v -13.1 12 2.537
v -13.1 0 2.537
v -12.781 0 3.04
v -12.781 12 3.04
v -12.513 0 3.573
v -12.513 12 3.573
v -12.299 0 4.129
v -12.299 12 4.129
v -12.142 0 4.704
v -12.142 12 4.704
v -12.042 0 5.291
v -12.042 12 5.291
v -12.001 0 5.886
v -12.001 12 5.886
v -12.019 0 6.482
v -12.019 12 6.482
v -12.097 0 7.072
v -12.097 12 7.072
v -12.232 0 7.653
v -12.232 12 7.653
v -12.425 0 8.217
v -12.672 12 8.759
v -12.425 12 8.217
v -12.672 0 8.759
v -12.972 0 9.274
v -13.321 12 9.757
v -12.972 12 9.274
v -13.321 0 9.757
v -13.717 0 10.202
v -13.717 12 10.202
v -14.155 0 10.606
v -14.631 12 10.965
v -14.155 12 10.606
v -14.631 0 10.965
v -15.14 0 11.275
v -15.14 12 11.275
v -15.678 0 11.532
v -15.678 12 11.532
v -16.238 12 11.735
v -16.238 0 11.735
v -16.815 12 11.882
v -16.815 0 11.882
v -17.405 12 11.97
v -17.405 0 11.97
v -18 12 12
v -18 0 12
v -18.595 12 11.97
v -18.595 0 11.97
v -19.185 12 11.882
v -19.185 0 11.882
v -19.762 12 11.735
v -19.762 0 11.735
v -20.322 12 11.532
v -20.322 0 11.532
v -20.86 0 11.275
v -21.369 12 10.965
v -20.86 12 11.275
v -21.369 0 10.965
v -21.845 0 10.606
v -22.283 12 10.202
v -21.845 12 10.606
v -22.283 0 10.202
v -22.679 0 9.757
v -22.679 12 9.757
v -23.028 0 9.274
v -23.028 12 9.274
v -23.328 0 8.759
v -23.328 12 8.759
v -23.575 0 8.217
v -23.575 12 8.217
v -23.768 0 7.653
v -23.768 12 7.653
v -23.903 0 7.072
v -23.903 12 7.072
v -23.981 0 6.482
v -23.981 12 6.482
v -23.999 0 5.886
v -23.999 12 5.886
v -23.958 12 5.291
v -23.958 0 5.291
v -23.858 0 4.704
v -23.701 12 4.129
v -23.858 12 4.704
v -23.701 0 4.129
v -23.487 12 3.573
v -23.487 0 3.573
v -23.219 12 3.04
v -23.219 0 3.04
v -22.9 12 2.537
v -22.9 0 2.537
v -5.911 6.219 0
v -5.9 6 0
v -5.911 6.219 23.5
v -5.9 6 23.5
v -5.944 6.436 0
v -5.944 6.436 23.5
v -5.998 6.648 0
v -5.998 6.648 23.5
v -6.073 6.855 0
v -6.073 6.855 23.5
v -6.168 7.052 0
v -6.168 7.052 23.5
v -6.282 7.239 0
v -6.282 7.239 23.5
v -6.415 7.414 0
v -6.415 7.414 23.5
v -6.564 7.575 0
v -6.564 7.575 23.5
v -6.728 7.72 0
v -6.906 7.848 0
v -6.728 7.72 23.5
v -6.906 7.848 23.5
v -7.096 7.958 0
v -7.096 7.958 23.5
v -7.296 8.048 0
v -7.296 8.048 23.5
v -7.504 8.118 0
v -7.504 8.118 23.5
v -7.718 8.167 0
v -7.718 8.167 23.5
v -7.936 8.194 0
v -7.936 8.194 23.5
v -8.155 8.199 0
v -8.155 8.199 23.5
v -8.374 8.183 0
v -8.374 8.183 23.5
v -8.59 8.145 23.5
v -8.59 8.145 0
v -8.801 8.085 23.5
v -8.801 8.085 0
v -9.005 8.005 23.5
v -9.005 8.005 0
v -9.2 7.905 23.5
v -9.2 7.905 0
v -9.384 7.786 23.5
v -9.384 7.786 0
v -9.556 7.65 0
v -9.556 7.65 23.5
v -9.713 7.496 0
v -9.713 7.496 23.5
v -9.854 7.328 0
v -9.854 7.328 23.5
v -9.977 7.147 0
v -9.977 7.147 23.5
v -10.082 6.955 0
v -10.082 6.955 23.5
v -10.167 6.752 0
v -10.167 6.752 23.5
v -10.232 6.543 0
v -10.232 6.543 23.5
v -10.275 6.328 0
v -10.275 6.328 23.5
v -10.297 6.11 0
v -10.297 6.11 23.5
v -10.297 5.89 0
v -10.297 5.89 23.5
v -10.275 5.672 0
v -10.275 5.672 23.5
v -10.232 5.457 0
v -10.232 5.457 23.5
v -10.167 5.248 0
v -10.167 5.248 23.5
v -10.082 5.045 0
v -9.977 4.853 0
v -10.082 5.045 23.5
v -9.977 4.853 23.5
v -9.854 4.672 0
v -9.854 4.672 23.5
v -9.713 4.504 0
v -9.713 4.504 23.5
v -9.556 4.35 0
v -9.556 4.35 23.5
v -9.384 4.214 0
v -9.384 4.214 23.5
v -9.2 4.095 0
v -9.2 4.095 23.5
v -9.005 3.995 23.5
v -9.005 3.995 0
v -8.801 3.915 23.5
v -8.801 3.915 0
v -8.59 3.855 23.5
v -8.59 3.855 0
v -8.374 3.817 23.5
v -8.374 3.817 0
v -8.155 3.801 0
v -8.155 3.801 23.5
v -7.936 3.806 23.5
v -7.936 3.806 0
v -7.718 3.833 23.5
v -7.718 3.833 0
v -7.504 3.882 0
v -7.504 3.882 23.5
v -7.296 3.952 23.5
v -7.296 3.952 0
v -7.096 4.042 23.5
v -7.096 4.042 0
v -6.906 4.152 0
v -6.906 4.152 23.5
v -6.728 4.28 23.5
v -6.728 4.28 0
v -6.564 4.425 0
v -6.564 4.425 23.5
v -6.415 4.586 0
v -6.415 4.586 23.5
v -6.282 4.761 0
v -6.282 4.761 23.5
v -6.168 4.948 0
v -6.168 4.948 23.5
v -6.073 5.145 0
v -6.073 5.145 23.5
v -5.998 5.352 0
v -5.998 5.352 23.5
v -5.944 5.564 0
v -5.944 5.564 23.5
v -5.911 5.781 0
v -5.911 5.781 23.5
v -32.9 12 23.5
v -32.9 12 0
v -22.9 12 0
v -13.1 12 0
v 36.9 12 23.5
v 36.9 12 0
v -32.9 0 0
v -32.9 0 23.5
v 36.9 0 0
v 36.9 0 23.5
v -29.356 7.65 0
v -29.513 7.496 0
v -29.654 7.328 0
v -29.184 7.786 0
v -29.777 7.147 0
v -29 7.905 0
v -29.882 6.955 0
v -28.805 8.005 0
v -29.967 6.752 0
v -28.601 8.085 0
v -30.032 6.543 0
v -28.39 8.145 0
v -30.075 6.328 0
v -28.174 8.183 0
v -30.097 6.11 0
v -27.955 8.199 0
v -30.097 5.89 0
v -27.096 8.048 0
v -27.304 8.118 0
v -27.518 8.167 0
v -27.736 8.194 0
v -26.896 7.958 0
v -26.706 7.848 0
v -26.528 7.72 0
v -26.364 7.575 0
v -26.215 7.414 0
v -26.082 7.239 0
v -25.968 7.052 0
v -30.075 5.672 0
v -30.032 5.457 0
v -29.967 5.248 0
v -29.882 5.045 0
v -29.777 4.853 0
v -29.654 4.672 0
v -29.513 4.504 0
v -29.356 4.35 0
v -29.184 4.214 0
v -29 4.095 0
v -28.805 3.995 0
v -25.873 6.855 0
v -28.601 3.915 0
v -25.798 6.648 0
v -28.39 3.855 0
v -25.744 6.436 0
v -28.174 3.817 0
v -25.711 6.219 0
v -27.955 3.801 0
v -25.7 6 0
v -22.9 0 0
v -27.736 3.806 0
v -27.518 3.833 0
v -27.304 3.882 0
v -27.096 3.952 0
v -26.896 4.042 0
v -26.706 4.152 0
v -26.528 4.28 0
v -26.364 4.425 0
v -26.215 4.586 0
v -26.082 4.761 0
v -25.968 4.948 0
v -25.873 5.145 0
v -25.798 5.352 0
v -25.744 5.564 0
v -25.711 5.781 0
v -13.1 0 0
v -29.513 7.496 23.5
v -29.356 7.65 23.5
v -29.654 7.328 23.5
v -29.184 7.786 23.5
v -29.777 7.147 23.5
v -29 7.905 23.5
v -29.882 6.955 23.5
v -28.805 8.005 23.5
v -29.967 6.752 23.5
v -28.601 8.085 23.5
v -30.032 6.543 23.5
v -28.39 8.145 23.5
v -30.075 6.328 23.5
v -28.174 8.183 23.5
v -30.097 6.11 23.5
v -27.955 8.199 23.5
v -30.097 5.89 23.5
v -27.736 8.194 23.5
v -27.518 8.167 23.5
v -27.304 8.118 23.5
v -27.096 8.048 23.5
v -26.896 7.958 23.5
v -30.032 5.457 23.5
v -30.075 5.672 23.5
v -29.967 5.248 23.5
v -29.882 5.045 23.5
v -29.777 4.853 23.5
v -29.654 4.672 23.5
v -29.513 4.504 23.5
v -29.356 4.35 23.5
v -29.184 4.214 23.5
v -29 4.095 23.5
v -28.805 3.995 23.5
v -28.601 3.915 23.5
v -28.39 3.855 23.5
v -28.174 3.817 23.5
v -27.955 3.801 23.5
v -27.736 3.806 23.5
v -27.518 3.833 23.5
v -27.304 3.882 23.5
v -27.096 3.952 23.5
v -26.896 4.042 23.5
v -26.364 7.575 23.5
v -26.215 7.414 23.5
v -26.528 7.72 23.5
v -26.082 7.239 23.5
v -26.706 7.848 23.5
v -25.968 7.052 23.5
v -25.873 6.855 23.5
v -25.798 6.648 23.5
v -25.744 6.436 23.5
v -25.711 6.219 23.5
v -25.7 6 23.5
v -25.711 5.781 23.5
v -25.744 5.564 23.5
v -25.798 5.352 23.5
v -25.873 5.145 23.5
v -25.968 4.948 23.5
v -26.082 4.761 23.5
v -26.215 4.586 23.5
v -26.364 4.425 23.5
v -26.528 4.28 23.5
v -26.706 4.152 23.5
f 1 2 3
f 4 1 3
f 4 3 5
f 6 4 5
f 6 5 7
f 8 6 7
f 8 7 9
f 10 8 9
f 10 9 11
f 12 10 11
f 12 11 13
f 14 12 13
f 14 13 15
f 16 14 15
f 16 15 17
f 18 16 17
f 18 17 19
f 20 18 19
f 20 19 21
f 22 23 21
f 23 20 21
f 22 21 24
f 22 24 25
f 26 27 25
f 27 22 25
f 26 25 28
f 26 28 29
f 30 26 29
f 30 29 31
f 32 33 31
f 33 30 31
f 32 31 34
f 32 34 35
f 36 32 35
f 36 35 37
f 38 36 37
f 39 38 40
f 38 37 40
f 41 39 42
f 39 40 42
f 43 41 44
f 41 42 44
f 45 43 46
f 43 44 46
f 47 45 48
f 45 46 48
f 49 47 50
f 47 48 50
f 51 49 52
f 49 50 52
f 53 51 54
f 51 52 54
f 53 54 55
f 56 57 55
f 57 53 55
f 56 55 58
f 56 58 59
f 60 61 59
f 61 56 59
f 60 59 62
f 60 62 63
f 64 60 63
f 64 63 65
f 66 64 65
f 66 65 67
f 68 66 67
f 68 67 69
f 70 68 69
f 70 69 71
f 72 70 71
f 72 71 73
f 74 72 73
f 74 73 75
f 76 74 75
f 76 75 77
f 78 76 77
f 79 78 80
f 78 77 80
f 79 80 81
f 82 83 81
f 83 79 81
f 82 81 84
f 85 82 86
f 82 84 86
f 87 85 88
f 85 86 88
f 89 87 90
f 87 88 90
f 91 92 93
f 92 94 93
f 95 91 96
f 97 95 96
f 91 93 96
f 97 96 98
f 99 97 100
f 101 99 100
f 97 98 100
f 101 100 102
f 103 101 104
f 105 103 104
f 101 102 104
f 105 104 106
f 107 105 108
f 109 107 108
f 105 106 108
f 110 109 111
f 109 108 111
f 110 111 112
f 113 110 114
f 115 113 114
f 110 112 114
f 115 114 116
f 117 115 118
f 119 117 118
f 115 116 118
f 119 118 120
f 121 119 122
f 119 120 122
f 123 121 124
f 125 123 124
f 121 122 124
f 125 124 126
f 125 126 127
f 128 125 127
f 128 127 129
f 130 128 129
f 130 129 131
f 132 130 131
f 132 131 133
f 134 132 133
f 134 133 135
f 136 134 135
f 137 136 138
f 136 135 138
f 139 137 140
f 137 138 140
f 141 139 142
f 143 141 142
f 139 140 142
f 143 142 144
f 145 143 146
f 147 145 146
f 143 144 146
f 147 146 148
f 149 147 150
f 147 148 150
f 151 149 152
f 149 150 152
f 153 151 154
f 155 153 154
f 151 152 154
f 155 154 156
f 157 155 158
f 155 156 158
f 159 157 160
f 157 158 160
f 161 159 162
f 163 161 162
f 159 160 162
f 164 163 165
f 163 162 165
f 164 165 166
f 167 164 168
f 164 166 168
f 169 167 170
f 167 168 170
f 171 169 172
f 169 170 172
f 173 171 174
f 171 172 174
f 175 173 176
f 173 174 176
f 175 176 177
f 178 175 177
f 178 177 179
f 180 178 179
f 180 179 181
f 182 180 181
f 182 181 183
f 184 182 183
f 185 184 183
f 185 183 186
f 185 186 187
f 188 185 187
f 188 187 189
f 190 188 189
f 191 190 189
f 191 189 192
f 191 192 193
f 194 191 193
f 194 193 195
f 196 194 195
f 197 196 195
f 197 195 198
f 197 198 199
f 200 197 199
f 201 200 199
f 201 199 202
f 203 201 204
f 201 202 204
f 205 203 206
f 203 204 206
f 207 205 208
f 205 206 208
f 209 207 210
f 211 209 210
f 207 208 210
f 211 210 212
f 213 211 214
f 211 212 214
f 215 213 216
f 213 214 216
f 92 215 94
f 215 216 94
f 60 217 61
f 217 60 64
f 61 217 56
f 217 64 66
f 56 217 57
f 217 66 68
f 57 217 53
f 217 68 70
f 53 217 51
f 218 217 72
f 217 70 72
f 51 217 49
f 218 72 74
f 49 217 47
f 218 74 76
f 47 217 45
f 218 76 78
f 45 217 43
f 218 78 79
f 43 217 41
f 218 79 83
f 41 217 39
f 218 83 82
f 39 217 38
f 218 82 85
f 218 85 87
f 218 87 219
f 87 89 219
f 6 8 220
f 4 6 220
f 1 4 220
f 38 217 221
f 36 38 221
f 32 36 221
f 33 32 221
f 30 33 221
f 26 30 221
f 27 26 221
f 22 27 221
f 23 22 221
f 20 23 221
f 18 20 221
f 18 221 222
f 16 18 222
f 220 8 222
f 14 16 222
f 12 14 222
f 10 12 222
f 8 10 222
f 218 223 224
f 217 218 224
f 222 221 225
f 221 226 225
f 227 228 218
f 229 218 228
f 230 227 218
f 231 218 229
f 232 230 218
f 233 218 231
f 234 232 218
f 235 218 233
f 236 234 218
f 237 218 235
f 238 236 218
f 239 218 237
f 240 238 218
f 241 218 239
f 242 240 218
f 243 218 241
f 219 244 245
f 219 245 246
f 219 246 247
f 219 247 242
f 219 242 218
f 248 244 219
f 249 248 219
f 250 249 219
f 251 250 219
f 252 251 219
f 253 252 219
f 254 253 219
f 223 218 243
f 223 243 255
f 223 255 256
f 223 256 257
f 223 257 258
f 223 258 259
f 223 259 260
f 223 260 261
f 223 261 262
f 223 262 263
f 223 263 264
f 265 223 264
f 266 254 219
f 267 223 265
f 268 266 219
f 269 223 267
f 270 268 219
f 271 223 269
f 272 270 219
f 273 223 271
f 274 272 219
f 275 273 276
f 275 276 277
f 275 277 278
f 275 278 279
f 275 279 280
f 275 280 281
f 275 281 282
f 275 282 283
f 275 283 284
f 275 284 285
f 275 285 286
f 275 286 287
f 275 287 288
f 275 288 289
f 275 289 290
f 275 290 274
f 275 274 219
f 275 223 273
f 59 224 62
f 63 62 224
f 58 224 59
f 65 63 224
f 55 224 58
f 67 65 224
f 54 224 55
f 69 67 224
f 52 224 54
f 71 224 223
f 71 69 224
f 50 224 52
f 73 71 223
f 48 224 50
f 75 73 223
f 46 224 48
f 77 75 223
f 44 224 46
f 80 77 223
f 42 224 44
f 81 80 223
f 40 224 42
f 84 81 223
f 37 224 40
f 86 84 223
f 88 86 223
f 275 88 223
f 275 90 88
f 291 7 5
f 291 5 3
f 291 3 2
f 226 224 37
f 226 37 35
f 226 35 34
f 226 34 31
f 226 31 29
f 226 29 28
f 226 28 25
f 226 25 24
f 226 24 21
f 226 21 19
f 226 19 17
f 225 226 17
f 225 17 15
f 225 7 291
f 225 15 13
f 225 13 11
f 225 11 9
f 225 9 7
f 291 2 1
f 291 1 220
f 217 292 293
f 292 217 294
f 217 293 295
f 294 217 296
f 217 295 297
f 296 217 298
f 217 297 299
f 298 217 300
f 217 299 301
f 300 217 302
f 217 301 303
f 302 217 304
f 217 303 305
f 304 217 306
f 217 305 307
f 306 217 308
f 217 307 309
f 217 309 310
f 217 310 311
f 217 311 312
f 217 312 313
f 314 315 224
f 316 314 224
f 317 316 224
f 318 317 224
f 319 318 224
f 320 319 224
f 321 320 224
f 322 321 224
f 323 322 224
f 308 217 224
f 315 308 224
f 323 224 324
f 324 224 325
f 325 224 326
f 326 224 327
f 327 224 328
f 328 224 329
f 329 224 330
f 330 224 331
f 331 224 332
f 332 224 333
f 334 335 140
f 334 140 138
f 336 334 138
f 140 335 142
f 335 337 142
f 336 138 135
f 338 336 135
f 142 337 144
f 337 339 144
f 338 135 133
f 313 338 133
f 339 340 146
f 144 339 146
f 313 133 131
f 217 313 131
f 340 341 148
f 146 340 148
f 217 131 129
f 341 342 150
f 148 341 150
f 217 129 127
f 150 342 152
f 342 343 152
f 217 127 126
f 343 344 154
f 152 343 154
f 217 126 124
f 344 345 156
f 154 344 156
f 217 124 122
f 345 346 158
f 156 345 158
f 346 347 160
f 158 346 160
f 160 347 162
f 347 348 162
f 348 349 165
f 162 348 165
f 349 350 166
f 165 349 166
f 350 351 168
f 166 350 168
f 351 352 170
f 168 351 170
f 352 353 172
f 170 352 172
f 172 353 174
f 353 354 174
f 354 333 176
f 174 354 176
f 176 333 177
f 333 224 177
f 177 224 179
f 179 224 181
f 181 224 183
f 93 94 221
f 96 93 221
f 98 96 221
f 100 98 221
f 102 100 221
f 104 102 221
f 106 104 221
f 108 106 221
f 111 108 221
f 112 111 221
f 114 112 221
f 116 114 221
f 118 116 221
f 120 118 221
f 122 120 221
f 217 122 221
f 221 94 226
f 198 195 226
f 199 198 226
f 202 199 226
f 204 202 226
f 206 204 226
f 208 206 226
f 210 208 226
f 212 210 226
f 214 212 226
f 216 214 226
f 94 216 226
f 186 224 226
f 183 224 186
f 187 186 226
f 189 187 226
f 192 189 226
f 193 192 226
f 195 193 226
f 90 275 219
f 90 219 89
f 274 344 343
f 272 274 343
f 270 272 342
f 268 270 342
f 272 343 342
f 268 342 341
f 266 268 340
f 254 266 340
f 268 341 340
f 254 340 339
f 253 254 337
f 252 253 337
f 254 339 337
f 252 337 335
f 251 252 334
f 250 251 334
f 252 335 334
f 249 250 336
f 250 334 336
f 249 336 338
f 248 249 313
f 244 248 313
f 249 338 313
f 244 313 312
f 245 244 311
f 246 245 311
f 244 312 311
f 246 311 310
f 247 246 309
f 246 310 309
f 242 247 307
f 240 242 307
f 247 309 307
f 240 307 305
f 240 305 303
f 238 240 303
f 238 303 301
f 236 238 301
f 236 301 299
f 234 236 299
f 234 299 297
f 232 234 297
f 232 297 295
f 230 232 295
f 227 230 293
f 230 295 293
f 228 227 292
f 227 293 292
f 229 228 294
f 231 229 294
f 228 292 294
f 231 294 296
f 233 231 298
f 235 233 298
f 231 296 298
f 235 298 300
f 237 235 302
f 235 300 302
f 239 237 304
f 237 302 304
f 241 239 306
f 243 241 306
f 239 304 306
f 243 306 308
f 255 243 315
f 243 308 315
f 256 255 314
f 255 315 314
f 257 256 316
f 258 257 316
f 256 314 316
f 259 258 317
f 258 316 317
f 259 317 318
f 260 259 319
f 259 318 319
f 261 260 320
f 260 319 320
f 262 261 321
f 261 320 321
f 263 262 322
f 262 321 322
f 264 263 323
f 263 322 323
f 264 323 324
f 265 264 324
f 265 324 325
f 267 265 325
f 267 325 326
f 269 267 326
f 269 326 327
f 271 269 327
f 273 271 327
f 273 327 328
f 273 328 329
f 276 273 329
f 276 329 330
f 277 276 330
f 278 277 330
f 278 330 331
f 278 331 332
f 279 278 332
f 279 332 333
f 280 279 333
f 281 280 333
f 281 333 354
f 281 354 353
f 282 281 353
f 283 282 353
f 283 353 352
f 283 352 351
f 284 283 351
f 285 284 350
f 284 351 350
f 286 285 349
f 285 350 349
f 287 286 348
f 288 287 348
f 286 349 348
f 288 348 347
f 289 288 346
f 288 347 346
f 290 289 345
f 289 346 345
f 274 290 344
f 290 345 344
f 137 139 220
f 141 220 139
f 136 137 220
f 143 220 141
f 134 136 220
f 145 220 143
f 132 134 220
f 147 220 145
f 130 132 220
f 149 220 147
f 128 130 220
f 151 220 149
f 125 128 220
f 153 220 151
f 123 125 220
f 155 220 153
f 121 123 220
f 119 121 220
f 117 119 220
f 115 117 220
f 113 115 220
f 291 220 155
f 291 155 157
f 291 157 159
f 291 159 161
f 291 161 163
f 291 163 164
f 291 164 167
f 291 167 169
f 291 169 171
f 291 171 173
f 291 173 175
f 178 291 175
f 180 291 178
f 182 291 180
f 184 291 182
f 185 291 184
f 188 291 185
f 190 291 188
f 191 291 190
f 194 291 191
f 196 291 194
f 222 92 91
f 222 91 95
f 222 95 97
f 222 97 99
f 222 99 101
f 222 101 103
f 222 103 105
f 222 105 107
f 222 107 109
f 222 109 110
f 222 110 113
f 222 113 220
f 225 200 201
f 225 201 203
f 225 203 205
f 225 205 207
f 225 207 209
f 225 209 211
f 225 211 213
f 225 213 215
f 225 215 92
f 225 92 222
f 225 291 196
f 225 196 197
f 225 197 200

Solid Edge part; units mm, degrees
sketch "Sketch1" plane through (0, 0, 0) normal (0, -1, 0) x (1, 0, 0)
  line L0 (-3.1, 16.5) -> (-3.1, 23.5)
  line L1 (-32.9, 23.5) -> (-3.1, 23.5)
  line L2 (-32.9, 16.5) -> (-32.9, 23.5)
  line L3 (-32.9, 0) -> (-32.9, 16.5)
  line L4 (-32.9, 0) -> (-22.9, 0)
  line L5 (-22.9, 0) -> (-22.9, 2.5373)
  line L6 (-13.1, 2.5373) -> (-13.1, 0)
  line L7 (-13.1, 0) -> (-3.1, 0)
  line L8 (-3.1, 16.5) -> (-3.1, 0)
  arc A0 (-22.9, 2.5373) -> (-13.1, 2.5373) centre (-18, 6) cw
extrude "Protrusion1" add sketch "Sketch1" against normal blind 12
sketch "Sketch2" plane through (-18, 6, 23.5) normal (0, 0, 1) x (1, 0, 0)
  circle A0 centre (9.9, 0) radius 2.2
  circle A1 centre (-9.9, 0) radius 2.2
  dimension "D1" = 19.8
extrude "Cutout1" cut sketch "Sketch2" against normal through all
sketch "Sketch3" plane through (-3.1, 6, 11.75) normal (1, 0, 0) x (0, 1, 0)
  line L0 (-6, -11.75) -> (-6, 11.75)
  line L1 (6, 11.75) -> (-6, 11.75)
  line L2 (6, -11.75) -> (6, 11.75)
  line L3 (6, -11.75) -> (-6, -11.75)
extrude "ExtrudedProtrusion_2" add sketch "Sketch3" along normal blind 40
